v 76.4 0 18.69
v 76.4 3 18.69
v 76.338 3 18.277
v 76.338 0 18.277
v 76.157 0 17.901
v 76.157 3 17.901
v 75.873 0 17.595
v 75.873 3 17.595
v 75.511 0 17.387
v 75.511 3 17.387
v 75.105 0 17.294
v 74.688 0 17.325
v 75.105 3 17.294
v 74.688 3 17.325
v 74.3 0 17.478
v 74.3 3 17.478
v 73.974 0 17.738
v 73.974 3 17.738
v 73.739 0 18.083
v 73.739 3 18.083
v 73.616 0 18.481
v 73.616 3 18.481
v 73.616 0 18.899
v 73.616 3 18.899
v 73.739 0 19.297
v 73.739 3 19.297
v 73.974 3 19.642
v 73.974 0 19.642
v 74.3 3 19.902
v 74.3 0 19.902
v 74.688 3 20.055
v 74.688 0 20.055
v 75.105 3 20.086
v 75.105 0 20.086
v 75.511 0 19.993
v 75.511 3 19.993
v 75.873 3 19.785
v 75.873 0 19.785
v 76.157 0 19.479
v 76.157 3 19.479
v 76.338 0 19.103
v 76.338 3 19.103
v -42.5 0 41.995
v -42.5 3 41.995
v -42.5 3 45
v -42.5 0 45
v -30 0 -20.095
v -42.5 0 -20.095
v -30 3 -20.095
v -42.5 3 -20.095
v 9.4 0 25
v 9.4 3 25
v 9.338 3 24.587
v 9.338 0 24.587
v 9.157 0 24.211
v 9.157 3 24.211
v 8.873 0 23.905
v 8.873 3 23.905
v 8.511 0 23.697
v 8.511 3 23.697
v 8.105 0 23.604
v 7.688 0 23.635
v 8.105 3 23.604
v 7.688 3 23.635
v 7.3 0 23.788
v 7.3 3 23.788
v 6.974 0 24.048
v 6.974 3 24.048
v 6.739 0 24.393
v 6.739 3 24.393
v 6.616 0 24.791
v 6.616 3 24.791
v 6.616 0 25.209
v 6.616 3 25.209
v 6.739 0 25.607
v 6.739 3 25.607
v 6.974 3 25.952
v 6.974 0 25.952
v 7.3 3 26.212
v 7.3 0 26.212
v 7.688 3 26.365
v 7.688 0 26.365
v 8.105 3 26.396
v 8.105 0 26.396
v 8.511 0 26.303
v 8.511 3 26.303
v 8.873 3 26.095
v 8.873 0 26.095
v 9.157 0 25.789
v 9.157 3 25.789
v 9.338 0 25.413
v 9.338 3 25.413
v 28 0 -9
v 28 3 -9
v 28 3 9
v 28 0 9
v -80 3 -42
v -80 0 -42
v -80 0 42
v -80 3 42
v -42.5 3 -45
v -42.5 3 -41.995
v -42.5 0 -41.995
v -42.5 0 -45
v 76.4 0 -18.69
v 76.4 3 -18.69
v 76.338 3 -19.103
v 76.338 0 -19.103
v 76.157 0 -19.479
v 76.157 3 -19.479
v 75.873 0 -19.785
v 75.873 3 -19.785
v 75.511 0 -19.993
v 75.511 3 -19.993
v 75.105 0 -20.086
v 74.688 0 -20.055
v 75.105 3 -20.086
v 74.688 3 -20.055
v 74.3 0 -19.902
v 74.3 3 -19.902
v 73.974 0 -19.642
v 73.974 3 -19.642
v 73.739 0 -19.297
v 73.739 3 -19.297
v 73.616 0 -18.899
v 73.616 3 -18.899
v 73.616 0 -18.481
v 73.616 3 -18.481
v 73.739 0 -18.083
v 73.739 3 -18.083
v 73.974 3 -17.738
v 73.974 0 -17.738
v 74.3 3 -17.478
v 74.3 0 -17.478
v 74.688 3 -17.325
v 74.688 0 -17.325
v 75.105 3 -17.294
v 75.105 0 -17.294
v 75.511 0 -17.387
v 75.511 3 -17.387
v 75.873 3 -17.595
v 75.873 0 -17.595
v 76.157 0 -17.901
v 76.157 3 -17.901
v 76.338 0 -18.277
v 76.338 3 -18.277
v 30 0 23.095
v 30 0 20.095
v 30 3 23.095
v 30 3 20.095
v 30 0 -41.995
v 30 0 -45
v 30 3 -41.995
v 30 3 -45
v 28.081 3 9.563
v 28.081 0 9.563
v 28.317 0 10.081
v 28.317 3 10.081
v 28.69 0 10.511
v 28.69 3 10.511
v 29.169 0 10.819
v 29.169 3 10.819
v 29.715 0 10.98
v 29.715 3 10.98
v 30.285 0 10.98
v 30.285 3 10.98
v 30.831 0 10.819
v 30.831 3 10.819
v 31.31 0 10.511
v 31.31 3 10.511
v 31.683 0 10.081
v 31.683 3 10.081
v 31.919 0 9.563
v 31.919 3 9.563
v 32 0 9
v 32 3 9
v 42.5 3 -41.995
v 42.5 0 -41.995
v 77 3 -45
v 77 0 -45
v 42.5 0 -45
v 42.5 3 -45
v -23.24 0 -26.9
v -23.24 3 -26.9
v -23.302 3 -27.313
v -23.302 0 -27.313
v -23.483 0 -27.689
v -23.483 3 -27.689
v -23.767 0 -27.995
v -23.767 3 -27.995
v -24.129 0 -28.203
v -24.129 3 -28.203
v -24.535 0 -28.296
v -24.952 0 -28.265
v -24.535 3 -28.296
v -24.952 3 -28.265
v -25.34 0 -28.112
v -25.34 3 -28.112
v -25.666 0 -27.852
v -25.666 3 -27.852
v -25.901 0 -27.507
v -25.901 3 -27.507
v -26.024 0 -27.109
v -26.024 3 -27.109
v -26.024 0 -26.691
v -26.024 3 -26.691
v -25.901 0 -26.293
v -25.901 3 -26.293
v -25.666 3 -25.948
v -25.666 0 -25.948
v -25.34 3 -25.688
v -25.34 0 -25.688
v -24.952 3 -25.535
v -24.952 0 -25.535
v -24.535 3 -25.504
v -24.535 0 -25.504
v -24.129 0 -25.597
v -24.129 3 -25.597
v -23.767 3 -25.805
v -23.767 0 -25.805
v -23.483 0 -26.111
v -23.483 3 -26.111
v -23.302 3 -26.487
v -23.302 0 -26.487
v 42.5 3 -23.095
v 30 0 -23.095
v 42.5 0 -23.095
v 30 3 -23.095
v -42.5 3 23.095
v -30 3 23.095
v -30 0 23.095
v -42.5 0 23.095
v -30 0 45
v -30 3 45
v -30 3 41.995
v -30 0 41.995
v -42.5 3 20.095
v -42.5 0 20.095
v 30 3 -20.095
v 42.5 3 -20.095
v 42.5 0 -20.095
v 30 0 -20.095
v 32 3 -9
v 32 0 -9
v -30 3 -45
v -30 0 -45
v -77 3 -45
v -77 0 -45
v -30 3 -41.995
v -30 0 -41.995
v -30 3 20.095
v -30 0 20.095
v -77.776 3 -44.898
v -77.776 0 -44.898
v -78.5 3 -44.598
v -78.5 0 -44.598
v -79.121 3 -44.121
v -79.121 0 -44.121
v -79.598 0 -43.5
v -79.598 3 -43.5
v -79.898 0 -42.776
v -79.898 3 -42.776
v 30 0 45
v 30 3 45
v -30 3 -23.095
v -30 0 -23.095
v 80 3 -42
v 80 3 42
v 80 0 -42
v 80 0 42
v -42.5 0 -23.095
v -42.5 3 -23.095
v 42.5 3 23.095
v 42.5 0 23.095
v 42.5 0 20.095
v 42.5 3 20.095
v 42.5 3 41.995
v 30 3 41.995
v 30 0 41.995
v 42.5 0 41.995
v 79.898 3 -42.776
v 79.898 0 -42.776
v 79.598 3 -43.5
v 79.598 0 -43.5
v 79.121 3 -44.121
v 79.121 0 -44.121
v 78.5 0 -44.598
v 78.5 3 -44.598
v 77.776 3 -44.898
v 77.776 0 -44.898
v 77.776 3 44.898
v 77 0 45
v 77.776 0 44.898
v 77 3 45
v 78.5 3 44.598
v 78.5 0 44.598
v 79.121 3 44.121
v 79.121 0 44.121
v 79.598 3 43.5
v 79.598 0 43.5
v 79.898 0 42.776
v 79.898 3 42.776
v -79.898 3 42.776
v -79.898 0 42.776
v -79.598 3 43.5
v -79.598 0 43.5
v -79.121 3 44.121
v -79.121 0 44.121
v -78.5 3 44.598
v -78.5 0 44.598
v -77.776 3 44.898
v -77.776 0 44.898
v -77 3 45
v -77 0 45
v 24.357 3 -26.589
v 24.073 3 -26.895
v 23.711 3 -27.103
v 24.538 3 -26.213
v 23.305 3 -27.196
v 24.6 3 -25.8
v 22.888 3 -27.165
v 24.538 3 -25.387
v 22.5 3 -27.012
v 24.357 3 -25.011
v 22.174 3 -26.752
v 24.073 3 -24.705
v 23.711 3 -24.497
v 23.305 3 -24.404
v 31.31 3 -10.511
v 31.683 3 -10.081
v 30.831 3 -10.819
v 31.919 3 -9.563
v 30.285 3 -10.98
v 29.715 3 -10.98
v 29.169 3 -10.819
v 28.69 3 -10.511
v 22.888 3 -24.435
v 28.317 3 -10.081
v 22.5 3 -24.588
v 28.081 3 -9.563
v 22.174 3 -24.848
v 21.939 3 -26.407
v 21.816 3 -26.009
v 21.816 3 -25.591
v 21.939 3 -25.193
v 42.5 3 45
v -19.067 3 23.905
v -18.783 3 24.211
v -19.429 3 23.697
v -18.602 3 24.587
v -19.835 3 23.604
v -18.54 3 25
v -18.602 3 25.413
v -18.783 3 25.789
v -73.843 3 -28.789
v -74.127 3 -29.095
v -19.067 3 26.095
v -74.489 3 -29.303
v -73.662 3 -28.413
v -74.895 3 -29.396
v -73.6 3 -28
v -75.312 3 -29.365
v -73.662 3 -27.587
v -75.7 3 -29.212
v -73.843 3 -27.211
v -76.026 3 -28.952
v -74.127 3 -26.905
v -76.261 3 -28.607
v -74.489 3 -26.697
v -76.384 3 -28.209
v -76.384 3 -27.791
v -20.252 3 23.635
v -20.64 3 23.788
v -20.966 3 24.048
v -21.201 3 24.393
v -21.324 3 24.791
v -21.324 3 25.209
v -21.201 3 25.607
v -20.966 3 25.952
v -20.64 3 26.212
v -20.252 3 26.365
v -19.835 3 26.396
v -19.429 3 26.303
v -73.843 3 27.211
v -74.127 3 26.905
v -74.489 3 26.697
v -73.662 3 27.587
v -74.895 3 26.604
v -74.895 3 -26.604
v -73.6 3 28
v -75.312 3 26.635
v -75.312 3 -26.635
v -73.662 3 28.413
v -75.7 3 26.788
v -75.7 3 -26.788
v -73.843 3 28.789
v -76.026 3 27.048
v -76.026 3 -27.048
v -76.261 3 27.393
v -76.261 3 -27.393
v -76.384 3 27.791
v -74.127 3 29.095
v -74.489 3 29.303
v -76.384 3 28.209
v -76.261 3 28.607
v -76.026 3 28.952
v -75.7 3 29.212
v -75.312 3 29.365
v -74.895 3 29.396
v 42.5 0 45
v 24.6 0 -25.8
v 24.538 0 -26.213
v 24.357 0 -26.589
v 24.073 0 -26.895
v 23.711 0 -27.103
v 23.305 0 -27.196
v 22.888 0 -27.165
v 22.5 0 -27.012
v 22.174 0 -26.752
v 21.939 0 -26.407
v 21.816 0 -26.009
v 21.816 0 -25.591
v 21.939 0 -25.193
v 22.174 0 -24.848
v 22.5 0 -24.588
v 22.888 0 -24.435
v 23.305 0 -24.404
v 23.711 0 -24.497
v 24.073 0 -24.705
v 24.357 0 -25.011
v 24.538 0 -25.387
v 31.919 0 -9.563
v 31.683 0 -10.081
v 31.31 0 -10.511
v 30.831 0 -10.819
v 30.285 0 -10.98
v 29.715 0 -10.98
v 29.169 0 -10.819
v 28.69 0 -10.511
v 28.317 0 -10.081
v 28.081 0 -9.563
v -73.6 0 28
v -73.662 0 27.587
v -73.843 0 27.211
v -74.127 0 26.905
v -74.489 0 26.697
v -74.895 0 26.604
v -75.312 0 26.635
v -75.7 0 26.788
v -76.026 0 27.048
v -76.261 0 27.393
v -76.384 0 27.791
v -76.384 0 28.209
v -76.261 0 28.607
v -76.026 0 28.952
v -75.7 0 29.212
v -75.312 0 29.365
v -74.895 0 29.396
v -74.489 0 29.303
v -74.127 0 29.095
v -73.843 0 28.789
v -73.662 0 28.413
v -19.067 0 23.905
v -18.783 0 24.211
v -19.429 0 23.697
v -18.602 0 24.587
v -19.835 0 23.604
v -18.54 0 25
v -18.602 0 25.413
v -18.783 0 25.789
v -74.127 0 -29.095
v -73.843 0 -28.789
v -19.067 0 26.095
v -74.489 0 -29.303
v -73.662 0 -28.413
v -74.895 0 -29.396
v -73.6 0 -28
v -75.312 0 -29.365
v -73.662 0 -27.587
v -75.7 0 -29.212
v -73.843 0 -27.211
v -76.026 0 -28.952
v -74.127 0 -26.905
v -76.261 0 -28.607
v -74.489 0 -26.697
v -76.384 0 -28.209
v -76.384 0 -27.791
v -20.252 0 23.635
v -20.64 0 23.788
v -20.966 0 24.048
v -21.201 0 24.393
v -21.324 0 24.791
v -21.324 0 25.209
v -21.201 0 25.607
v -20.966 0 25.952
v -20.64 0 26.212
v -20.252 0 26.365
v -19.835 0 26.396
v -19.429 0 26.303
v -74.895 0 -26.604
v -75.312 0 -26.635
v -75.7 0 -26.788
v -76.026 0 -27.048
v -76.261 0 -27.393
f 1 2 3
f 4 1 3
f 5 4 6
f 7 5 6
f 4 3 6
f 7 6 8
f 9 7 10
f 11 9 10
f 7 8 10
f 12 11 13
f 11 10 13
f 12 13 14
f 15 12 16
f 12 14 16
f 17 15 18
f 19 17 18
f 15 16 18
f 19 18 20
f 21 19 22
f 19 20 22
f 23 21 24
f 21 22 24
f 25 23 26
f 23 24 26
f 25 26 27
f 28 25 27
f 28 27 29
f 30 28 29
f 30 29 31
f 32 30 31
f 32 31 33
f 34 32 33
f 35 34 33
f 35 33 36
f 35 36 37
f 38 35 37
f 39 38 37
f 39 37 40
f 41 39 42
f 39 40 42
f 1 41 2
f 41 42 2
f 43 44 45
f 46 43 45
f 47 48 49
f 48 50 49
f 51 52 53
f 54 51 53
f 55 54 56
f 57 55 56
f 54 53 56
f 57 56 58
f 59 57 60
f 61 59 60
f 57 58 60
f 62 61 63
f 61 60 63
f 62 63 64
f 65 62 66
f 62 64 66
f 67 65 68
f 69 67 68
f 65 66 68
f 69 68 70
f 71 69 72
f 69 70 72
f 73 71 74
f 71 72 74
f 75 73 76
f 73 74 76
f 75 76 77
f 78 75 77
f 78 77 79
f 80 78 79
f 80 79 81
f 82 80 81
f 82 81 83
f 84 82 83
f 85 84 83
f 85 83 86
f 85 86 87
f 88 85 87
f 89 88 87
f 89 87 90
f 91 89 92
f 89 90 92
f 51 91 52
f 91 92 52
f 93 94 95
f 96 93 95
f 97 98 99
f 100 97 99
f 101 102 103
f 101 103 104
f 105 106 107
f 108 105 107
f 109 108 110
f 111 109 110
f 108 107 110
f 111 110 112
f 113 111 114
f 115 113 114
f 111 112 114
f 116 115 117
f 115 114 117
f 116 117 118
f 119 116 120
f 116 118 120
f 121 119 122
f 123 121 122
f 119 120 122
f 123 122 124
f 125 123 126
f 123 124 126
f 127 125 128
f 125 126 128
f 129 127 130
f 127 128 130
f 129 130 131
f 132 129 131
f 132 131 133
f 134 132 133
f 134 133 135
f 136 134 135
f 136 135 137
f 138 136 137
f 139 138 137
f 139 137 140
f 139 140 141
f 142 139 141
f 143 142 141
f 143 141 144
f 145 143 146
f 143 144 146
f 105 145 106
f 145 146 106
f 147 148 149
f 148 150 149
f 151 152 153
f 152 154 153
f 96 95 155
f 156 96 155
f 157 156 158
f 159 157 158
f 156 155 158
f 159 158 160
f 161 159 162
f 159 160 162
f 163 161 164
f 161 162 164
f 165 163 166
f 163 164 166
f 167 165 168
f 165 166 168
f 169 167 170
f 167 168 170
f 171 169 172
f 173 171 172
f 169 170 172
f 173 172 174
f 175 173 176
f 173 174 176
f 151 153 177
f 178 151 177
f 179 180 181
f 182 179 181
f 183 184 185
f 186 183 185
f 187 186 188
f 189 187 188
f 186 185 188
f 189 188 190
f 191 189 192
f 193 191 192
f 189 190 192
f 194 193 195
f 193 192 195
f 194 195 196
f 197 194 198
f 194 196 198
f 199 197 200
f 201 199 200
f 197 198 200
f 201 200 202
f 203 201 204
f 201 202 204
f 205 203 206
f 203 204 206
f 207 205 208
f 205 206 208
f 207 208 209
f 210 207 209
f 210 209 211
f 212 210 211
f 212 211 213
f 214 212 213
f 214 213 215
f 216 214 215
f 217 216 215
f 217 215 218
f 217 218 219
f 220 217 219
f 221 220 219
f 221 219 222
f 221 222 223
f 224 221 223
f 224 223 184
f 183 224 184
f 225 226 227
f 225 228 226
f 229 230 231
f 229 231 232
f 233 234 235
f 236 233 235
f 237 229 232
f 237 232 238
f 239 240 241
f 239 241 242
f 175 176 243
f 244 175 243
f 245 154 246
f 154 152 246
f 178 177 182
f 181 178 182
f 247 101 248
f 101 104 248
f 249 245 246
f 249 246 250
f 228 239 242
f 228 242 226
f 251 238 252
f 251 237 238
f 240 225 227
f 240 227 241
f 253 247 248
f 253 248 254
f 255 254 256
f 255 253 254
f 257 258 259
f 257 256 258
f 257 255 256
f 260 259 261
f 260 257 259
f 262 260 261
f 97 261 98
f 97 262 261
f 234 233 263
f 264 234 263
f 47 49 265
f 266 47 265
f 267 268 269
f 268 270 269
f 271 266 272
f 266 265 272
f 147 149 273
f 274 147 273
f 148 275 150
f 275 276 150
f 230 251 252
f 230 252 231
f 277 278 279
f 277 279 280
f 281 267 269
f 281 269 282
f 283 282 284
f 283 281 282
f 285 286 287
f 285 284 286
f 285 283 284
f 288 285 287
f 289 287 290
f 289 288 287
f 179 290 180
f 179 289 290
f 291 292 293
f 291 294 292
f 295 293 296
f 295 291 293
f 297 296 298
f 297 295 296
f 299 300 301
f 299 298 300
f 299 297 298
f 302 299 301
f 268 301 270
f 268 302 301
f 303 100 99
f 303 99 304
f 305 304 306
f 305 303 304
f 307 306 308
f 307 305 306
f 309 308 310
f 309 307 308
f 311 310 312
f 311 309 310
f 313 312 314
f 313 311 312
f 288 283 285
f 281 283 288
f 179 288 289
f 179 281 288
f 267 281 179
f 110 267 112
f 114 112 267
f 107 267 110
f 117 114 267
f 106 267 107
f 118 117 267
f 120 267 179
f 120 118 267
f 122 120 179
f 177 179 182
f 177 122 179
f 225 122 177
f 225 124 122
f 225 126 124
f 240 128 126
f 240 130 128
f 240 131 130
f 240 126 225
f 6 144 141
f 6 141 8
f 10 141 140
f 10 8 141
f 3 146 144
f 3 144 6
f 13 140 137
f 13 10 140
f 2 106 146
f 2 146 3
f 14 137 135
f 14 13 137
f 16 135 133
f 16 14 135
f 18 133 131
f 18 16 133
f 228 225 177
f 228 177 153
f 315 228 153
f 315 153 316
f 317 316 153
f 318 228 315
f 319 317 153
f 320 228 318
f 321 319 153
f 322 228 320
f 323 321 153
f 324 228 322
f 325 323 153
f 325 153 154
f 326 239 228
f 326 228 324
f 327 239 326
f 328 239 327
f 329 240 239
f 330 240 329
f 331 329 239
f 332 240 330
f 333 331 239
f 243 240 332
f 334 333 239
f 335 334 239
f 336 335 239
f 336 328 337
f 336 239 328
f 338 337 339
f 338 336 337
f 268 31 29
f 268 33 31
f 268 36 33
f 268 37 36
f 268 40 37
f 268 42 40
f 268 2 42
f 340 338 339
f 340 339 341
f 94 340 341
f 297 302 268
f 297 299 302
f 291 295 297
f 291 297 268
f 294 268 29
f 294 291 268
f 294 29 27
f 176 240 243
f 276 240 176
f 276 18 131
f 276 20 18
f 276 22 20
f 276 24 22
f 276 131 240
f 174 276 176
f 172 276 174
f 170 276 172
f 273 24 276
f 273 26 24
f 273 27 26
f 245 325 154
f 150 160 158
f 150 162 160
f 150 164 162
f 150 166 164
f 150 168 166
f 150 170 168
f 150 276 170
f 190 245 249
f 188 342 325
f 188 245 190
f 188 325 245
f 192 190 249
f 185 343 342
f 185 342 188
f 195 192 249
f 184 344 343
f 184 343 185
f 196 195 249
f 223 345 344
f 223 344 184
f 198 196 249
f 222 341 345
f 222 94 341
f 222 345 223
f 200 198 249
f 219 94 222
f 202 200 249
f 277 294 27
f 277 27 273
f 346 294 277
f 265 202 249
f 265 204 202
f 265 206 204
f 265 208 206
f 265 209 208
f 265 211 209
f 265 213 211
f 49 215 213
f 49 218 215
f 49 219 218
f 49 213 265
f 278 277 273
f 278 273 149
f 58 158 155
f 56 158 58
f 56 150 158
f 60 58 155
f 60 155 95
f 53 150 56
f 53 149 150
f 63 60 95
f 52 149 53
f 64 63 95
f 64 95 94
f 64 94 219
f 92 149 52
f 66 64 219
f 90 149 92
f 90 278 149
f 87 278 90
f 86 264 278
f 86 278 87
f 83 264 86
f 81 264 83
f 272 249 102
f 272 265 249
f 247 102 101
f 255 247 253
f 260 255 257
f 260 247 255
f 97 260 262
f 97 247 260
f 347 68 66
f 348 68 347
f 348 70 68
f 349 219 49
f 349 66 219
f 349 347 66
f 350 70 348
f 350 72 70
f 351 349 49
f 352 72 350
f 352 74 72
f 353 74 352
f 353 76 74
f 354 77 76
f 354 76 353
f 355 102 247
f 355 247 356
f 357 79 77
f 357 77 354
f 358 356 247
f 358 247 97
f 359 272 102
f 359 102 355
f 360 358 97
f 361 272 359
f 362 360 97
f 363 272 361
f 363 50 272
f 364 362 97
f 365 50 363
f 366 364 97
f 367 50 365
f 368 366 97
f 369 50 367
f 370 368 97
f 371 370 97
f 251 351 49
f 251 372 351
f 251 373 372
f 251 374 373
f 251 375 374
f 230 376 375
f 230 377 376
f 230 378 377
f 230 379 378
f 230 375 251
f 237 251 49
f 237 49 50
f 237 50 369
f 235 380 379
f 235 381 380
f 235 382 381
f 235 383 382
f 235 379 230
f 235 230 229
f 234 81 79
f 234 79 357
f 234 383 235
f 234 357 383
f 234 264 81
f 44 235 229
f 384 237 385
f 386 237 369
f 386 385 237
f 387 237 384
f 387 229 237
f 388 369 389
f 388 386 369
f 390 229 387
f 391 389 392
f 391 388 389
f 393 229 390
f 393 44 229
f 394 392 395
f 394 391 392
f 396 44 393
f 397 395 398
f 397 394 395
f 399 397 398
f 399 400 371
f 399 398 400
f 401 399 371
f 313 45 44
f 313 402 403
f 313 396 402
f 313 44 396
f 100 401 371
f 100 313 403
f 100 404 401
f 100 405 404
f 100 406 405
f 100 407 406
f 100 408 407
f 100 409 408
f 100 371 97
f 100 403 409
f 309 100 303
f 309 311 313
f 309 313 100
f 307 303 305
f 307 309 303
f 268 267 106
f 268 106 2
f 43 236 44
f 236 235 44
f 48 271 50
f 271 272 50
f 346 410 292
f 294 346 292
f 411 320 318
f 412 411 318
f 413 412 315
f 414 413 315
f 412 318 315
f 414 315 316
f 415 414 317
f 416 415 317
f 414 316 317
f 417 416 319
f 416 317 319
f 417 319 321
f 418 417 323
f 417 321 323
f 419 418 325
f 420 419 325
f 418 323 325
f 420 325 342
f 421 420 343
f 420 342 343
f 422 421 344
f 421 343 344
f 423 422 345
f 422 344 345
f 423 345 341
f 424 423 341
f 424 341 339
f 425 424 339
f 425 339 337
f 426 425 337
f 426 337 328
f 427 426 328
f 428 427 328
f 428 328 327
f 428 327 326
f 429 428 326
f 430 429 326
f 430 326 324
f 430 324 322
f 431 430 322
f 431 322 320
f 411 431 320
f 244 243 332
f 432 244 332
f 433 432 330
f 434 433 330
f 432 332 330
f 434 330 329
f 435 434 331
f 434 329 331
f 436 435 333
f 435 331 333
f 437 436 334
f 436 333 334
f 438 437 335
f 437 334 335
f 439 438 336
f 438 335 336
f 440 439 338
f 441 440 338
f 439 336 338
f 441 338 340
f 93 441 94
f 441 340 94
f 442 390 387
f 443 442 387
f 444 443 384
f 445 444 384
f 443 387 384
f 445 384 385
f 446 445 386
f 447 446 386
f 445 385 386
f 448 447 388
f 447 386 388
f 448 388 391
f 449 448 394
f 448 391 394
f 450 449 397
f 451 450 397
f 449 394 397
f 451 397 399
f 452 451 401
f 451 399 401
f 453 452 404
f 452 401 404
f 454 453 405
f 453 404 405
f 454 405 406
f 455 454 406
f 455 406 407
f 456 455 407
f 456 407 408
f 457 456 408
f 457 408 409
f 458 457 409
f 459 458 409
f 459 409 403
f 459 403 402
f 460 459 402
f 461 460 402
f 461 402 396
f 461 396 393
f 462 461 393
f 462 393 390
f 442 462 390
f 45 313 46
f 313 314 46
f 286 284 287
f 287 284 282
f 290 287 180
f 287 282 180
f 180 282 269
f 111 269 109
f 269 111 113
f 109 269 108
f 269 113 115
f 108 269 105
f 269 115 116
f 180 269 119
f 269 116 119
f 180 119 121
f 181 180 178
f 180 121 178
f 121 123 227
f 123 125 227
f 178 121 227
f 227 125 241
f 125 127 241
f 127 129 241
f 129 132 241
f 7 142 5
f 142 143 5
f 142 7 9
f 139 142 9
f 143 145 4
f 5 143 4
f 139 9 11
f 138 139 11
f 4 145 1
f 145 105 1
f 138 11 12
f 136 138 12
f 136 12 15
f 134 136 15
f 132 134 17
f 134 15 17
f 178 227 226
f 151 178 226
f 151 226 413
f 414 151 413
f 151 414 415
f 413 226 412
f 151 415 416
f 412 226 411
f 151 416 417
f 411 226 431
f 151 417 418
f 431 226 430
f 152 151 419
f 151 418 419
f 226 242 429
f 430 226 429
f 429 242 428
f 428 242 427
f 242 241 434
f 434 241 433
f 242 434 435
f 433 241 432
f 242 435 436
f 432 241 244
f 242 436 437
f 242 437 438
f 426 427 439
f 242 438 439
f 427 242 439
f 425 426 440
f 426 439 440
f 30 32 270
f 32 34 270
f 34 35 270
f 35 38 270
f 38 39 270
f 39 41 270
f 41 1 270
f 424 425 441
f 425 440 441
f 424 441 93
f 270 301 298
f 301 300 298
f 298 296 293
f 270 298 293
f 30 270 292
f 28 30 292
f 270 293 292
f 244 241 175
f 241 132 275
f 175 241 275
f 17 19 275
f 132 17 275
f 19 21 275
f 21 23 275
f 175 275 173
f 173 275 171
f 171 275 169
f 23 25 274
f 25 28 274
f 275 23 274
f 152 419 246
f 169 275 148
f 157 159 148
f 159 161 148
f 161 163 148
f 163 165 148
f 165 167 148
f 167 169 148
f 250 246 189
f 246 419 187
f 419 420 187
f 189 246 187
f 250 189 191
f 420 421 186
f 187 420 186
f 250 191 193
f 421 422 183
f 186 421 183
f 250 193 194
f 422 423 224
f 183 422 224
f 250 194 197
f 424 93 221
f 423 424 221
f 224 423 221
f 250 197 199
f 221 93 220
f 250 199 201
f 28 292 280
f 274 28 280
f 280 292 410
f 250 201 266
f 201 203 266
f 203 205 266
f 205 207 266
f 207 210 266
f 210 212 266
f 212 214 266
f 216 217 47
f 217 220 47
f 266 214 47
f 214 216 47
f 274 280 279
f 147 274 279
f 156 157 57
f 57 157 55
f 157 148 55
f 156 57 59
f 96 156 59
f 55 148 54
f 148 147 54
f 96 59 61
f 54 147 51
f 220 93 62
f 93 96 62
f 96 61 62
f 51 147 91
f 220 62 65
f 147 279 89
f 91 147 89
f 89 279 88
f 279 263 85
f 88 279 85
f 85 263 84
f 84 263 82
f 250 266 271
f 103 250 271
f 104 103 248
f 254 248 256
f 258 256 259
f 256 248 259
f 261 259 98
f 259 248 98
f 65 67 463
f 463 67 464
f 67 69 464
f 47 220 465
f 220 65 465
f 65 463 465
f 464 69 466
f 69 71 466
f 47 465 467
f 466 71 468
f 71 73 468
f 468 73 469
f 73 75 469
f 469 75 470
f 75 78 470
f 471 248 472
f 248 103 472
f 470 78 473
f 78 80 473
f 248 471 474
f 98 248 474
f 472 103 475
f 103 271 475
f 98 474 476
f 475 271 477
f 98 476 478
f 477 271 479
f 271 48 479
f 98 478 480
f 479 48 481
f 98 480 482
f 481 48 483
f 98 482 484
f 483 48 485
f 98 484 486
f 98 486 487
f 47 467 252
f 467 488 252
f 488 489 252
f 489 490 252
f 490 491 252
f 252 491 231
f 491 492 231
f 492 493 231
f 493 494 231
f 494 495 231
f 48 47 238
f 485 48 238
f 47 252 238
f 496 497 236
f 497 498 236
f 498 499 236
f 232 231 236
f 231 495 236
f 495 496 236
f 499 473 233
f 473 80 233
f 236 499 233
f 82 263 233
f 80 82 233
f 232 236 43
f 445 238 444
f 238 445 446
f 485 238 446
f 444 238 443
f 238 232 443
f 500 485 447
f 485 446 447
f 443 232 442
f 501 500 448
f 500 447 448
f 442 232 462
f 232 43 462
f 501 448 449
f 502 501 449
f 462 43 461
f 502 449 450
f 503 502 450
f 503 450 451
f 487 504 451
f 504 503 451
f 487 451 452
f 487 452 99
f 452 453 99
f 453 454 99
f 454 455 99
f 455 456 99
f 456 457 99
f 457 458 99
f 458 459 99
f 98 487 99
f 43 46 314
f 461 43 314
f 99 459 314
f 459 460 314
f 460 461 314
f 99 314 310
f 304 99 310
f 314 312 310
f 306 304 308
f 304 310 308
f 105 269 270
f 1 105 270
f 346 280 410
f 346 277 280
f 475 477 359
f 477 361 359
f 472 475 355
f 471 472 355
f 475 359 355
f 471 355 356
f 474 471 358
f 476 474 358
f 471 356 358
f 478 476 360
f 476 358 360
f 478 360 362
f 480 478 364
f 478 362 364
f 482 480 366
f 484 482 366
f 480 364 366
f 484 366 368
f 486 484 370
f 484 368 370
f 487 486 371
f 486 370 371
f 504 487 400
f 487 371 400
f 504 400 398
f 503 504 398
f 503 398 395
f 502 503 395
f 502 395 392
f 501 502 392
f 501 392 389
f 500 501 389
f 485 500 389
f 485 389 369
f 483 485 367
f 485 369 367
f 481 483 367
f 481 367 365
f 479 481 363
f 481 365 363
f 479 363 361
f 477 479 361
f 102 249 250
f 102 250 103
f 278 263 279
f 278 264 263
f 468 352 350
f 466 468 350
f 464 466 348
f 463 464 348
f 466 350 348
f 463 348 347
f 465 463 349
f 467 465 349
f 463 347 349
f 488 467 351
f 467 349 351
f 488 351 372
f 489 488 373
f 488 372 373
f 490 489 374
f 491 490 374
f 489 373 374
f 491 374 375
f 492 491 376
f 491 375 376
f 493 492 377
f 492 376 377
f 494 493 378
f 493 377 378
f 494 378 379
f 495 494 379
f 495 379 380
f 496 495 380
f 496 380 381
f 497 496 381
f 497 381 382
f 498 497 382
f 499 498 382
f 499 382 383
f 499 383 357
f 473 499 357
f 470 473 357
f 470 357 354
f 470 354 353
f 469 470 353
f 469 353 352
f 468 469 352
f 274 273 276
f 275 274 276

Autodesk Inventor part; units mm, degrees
ref_plane "YZ Plane" through (0, 0, 0) normal (1, 0, 0) x (0, 1, 0)
ref_plane "XZ Plane" through (0, 0, 0) normal (0, 1, 0) x (-1, 0, 0)
ref_plane "XY Plane" through (0, 0, 0) normal (0, 0, 1) x (1, 0, 0)
sketch "Sketch1" plane through (0, 0, 0) normal (0, 1, 0) x (-1, 0, 0)
  line L0 (80, 45) -> (-80, 45)
  line L1 (-80, 45) -> (-80, -45)
  line L2 (-80, -45) -> (80, -45)
  line L3 (80, -45) -> (80, 45)
  line L4 (80, 45) -> (-80, -45) construction
  line L5 (-80, 45) -> (80, -45) construction
  point P0 (0, 0)
  dimension "d0" = 160
  dimension "d1" = 90
extrude "Extrusion1" add sketch "Sketch1" along normal blind 3
sketch "Sketch2" plane through (0, 3, 0) normal (0, 1, 0) x (1, 0, 0)
  line L0 (-42.5, -45) -> (-30, -45)
  line L1 (-30, -45) -> (-30, -41.995)
  line L2 (-30, -41.995) -> (-42.5, -41.995)
  line L3 (-42.5, -41.995) -> (-42.5, -45)
  line L4 (-80, -45) -> (80, -45) construction
  line L5 (0, -45) -> (0, 45) construction
  line L6 (80, 45) -> (-80, 45) construction
  line L7 (-80, 45) -> (-80, -45) construction
  line L8 (-80, 0) -> (80, 0) construction
  line L9 (80, -45) -> (80, 45) construction
  line L10 (-30, -23.095) -> (-42.5, -23.095)
  line L11 (-42.5, -23.095) -> (-42.5, -20.095)
  line L12 (-42.5, -20.095) -> (-30, -20.095)
  line L13 (-30, -20.095) -> (-30, -23.095)
  line L14 (-42.5, 45) -> (-30, 45)
  line L15 (-30, 45) -> (-30, 41.995)
  line L16 (-30, 41.995) -> (-42.5, 41.995)
  line L17 (-42.5, 41.995) -> (-42.5, 45)
  line L18 (-30, 23.095) -> (-42.5, 23.095)
  line L19 (-42.5, 23.095) -> (-42.5, 20.095)
  line L20 (-42.5, 20.095) -> (-30, 20.095)
  line L21 (-30, 20.095) -> (-30, 23.095)
  line L22 (42.5, -45) -> (30, -45)
  line L23 (30, -45) -> (30, -41.995)
  line L24 (30, -41.995) -> (42.5, -41.995)
  line L25 (42.5, -41.995) -> (42.5, -45)
  line L26 (30, -23.095) -> (42.5, -23.095)
  line L27 (42.5, -23.095) -> (42.5, -20.095)
  line L28 (42.5, -20.095) -> (30, -20.095)
  line L29 (30, -20.095) -> (30, -23.095)
  line L30 (30, 45) -> (30, 41.995)
  line L31 (30, 20.095) -> (30, 23.095)
  line L32 (42.5, 45) -> (30, 45)
  line L33 (42.5, 41.995) -> (42.5, 45)
  line L34 (30, 23.095) -> (42.5, 23.095)
  line L35 (42.5, 23.095) -> (42.5, 20.095)
  line L36 (42.5, 20.095) -> (30, 20.095)
  line L37 (30, 41.995) -> (42.5, 41.995)
  point P0 (0, 0)
  point P1 (-36.25, -45)
  point P2 (-36.25, 45)
  point P3 (36.25, -45)
  point P4 (36.25, 45)
  dimension "d4" = 12.5
  dimension "d5" = 3.005
  dimension "d6" = 50
  dimension "d9" = 12.5
  dimension "d10" = 3
  dimension "d11" = 18.9
extrude "Extrusion2" cut sketch "Sketch2" against normal through all
fillet "Fillet1" radius 3 4 edges at (-80, 1.5, 45) (-80, 1.5, -45) (80, 1.5, -45) (80, 1.5, 45)
sketch "Sketch4" plane through (0, 3, 0) normal (0, 1, 0) x (1, 0, 0)
  line L0 (30, 9) -> (30, -9) construction
  line L1 (28, 9) -> (28, -9)
  line L2 (32, -9) -> (32, 9)
  arc A0 (32, 9) -> (28, 9) centre (30, 9) ccw
  arc A1 (28, -9) -> (32, -9) centre (30, -9) ccw
  line L3 (80, -42) -> (80, 42) projected
  line L4 (42.5, -45) -> (77, -45) projected
  point P0 (0, 0)
  point P1 (30, 0)
  dimension "d18" = 9
  dimension "d19" = 4
  dimension "d20" = 48
extrude "Extrusion4" cut sketch "Sketch4" against normal through all
sketch "Sketch5" plane through (0, 3, 0) normal (0, 1, 0) x (1, 0, 0)
  circle A0 centre (75, -18.69) radius 1.4
  line L0 (80, -42) -> (80, 42) construction
  line L1 (80, 0) -> (-80, 0) construction
  line L2 (-80, 42) -> (-80, -42) construction
  circle A1 centre (75, 18.69) radius 1.4
  circle A2 centre (-75, 28) radius 1.4
  circle A3 centre (-75, -28) radius 1.4
  circle A4 centre (-19.94, -25) radius 1.4
  circle A5 centre (8, -25) radius 1.4
  line L3 (-30, -45) -> (30, -45) construction
  line L4 (8, -25) -> (23.2, -25) construction
  line L5 (23.2, -25) -> (23.2, 25.8) construction
  circle A6 centre (23.2, 25.8) radius 1.4
  line L6 (-19.94, -25) -> (-24.64, -25) construction
  line L7 (-24.64, -25) -> (-24.64, 26.9) construction
  circle A7 centre (-24.64, 26.9) radius 1.4
  line L8 (-19.94, -25) -> (8, -25) construction
  point P0 (0, 0)
  dimension "d23" = 2.8
  dimension "d24" = 18.69
  dimension "d25" = 5
  dimension "d29" = 2.8
  dimension "d30" = 5
  dimension "d31" = 28
  dimension "d32" = 2.8
  dimension "d33" = 2.8
  dimension "d40" = 15.2
  dimension "d41" = 2.8
  dimension "d43" = 4.7
  dimension "d44" = 2.8
  dimension "d46" = 27.94
  dimension "d47" = 20
  dimension "d48" = 51.9
  dimension "d49" = 50.8
  dimension "d50" = 20
  dimension "d51" = 72
extrude "Extrusion5" cut sketch "Sketch5" against normal through all
properties part number "chassis"
